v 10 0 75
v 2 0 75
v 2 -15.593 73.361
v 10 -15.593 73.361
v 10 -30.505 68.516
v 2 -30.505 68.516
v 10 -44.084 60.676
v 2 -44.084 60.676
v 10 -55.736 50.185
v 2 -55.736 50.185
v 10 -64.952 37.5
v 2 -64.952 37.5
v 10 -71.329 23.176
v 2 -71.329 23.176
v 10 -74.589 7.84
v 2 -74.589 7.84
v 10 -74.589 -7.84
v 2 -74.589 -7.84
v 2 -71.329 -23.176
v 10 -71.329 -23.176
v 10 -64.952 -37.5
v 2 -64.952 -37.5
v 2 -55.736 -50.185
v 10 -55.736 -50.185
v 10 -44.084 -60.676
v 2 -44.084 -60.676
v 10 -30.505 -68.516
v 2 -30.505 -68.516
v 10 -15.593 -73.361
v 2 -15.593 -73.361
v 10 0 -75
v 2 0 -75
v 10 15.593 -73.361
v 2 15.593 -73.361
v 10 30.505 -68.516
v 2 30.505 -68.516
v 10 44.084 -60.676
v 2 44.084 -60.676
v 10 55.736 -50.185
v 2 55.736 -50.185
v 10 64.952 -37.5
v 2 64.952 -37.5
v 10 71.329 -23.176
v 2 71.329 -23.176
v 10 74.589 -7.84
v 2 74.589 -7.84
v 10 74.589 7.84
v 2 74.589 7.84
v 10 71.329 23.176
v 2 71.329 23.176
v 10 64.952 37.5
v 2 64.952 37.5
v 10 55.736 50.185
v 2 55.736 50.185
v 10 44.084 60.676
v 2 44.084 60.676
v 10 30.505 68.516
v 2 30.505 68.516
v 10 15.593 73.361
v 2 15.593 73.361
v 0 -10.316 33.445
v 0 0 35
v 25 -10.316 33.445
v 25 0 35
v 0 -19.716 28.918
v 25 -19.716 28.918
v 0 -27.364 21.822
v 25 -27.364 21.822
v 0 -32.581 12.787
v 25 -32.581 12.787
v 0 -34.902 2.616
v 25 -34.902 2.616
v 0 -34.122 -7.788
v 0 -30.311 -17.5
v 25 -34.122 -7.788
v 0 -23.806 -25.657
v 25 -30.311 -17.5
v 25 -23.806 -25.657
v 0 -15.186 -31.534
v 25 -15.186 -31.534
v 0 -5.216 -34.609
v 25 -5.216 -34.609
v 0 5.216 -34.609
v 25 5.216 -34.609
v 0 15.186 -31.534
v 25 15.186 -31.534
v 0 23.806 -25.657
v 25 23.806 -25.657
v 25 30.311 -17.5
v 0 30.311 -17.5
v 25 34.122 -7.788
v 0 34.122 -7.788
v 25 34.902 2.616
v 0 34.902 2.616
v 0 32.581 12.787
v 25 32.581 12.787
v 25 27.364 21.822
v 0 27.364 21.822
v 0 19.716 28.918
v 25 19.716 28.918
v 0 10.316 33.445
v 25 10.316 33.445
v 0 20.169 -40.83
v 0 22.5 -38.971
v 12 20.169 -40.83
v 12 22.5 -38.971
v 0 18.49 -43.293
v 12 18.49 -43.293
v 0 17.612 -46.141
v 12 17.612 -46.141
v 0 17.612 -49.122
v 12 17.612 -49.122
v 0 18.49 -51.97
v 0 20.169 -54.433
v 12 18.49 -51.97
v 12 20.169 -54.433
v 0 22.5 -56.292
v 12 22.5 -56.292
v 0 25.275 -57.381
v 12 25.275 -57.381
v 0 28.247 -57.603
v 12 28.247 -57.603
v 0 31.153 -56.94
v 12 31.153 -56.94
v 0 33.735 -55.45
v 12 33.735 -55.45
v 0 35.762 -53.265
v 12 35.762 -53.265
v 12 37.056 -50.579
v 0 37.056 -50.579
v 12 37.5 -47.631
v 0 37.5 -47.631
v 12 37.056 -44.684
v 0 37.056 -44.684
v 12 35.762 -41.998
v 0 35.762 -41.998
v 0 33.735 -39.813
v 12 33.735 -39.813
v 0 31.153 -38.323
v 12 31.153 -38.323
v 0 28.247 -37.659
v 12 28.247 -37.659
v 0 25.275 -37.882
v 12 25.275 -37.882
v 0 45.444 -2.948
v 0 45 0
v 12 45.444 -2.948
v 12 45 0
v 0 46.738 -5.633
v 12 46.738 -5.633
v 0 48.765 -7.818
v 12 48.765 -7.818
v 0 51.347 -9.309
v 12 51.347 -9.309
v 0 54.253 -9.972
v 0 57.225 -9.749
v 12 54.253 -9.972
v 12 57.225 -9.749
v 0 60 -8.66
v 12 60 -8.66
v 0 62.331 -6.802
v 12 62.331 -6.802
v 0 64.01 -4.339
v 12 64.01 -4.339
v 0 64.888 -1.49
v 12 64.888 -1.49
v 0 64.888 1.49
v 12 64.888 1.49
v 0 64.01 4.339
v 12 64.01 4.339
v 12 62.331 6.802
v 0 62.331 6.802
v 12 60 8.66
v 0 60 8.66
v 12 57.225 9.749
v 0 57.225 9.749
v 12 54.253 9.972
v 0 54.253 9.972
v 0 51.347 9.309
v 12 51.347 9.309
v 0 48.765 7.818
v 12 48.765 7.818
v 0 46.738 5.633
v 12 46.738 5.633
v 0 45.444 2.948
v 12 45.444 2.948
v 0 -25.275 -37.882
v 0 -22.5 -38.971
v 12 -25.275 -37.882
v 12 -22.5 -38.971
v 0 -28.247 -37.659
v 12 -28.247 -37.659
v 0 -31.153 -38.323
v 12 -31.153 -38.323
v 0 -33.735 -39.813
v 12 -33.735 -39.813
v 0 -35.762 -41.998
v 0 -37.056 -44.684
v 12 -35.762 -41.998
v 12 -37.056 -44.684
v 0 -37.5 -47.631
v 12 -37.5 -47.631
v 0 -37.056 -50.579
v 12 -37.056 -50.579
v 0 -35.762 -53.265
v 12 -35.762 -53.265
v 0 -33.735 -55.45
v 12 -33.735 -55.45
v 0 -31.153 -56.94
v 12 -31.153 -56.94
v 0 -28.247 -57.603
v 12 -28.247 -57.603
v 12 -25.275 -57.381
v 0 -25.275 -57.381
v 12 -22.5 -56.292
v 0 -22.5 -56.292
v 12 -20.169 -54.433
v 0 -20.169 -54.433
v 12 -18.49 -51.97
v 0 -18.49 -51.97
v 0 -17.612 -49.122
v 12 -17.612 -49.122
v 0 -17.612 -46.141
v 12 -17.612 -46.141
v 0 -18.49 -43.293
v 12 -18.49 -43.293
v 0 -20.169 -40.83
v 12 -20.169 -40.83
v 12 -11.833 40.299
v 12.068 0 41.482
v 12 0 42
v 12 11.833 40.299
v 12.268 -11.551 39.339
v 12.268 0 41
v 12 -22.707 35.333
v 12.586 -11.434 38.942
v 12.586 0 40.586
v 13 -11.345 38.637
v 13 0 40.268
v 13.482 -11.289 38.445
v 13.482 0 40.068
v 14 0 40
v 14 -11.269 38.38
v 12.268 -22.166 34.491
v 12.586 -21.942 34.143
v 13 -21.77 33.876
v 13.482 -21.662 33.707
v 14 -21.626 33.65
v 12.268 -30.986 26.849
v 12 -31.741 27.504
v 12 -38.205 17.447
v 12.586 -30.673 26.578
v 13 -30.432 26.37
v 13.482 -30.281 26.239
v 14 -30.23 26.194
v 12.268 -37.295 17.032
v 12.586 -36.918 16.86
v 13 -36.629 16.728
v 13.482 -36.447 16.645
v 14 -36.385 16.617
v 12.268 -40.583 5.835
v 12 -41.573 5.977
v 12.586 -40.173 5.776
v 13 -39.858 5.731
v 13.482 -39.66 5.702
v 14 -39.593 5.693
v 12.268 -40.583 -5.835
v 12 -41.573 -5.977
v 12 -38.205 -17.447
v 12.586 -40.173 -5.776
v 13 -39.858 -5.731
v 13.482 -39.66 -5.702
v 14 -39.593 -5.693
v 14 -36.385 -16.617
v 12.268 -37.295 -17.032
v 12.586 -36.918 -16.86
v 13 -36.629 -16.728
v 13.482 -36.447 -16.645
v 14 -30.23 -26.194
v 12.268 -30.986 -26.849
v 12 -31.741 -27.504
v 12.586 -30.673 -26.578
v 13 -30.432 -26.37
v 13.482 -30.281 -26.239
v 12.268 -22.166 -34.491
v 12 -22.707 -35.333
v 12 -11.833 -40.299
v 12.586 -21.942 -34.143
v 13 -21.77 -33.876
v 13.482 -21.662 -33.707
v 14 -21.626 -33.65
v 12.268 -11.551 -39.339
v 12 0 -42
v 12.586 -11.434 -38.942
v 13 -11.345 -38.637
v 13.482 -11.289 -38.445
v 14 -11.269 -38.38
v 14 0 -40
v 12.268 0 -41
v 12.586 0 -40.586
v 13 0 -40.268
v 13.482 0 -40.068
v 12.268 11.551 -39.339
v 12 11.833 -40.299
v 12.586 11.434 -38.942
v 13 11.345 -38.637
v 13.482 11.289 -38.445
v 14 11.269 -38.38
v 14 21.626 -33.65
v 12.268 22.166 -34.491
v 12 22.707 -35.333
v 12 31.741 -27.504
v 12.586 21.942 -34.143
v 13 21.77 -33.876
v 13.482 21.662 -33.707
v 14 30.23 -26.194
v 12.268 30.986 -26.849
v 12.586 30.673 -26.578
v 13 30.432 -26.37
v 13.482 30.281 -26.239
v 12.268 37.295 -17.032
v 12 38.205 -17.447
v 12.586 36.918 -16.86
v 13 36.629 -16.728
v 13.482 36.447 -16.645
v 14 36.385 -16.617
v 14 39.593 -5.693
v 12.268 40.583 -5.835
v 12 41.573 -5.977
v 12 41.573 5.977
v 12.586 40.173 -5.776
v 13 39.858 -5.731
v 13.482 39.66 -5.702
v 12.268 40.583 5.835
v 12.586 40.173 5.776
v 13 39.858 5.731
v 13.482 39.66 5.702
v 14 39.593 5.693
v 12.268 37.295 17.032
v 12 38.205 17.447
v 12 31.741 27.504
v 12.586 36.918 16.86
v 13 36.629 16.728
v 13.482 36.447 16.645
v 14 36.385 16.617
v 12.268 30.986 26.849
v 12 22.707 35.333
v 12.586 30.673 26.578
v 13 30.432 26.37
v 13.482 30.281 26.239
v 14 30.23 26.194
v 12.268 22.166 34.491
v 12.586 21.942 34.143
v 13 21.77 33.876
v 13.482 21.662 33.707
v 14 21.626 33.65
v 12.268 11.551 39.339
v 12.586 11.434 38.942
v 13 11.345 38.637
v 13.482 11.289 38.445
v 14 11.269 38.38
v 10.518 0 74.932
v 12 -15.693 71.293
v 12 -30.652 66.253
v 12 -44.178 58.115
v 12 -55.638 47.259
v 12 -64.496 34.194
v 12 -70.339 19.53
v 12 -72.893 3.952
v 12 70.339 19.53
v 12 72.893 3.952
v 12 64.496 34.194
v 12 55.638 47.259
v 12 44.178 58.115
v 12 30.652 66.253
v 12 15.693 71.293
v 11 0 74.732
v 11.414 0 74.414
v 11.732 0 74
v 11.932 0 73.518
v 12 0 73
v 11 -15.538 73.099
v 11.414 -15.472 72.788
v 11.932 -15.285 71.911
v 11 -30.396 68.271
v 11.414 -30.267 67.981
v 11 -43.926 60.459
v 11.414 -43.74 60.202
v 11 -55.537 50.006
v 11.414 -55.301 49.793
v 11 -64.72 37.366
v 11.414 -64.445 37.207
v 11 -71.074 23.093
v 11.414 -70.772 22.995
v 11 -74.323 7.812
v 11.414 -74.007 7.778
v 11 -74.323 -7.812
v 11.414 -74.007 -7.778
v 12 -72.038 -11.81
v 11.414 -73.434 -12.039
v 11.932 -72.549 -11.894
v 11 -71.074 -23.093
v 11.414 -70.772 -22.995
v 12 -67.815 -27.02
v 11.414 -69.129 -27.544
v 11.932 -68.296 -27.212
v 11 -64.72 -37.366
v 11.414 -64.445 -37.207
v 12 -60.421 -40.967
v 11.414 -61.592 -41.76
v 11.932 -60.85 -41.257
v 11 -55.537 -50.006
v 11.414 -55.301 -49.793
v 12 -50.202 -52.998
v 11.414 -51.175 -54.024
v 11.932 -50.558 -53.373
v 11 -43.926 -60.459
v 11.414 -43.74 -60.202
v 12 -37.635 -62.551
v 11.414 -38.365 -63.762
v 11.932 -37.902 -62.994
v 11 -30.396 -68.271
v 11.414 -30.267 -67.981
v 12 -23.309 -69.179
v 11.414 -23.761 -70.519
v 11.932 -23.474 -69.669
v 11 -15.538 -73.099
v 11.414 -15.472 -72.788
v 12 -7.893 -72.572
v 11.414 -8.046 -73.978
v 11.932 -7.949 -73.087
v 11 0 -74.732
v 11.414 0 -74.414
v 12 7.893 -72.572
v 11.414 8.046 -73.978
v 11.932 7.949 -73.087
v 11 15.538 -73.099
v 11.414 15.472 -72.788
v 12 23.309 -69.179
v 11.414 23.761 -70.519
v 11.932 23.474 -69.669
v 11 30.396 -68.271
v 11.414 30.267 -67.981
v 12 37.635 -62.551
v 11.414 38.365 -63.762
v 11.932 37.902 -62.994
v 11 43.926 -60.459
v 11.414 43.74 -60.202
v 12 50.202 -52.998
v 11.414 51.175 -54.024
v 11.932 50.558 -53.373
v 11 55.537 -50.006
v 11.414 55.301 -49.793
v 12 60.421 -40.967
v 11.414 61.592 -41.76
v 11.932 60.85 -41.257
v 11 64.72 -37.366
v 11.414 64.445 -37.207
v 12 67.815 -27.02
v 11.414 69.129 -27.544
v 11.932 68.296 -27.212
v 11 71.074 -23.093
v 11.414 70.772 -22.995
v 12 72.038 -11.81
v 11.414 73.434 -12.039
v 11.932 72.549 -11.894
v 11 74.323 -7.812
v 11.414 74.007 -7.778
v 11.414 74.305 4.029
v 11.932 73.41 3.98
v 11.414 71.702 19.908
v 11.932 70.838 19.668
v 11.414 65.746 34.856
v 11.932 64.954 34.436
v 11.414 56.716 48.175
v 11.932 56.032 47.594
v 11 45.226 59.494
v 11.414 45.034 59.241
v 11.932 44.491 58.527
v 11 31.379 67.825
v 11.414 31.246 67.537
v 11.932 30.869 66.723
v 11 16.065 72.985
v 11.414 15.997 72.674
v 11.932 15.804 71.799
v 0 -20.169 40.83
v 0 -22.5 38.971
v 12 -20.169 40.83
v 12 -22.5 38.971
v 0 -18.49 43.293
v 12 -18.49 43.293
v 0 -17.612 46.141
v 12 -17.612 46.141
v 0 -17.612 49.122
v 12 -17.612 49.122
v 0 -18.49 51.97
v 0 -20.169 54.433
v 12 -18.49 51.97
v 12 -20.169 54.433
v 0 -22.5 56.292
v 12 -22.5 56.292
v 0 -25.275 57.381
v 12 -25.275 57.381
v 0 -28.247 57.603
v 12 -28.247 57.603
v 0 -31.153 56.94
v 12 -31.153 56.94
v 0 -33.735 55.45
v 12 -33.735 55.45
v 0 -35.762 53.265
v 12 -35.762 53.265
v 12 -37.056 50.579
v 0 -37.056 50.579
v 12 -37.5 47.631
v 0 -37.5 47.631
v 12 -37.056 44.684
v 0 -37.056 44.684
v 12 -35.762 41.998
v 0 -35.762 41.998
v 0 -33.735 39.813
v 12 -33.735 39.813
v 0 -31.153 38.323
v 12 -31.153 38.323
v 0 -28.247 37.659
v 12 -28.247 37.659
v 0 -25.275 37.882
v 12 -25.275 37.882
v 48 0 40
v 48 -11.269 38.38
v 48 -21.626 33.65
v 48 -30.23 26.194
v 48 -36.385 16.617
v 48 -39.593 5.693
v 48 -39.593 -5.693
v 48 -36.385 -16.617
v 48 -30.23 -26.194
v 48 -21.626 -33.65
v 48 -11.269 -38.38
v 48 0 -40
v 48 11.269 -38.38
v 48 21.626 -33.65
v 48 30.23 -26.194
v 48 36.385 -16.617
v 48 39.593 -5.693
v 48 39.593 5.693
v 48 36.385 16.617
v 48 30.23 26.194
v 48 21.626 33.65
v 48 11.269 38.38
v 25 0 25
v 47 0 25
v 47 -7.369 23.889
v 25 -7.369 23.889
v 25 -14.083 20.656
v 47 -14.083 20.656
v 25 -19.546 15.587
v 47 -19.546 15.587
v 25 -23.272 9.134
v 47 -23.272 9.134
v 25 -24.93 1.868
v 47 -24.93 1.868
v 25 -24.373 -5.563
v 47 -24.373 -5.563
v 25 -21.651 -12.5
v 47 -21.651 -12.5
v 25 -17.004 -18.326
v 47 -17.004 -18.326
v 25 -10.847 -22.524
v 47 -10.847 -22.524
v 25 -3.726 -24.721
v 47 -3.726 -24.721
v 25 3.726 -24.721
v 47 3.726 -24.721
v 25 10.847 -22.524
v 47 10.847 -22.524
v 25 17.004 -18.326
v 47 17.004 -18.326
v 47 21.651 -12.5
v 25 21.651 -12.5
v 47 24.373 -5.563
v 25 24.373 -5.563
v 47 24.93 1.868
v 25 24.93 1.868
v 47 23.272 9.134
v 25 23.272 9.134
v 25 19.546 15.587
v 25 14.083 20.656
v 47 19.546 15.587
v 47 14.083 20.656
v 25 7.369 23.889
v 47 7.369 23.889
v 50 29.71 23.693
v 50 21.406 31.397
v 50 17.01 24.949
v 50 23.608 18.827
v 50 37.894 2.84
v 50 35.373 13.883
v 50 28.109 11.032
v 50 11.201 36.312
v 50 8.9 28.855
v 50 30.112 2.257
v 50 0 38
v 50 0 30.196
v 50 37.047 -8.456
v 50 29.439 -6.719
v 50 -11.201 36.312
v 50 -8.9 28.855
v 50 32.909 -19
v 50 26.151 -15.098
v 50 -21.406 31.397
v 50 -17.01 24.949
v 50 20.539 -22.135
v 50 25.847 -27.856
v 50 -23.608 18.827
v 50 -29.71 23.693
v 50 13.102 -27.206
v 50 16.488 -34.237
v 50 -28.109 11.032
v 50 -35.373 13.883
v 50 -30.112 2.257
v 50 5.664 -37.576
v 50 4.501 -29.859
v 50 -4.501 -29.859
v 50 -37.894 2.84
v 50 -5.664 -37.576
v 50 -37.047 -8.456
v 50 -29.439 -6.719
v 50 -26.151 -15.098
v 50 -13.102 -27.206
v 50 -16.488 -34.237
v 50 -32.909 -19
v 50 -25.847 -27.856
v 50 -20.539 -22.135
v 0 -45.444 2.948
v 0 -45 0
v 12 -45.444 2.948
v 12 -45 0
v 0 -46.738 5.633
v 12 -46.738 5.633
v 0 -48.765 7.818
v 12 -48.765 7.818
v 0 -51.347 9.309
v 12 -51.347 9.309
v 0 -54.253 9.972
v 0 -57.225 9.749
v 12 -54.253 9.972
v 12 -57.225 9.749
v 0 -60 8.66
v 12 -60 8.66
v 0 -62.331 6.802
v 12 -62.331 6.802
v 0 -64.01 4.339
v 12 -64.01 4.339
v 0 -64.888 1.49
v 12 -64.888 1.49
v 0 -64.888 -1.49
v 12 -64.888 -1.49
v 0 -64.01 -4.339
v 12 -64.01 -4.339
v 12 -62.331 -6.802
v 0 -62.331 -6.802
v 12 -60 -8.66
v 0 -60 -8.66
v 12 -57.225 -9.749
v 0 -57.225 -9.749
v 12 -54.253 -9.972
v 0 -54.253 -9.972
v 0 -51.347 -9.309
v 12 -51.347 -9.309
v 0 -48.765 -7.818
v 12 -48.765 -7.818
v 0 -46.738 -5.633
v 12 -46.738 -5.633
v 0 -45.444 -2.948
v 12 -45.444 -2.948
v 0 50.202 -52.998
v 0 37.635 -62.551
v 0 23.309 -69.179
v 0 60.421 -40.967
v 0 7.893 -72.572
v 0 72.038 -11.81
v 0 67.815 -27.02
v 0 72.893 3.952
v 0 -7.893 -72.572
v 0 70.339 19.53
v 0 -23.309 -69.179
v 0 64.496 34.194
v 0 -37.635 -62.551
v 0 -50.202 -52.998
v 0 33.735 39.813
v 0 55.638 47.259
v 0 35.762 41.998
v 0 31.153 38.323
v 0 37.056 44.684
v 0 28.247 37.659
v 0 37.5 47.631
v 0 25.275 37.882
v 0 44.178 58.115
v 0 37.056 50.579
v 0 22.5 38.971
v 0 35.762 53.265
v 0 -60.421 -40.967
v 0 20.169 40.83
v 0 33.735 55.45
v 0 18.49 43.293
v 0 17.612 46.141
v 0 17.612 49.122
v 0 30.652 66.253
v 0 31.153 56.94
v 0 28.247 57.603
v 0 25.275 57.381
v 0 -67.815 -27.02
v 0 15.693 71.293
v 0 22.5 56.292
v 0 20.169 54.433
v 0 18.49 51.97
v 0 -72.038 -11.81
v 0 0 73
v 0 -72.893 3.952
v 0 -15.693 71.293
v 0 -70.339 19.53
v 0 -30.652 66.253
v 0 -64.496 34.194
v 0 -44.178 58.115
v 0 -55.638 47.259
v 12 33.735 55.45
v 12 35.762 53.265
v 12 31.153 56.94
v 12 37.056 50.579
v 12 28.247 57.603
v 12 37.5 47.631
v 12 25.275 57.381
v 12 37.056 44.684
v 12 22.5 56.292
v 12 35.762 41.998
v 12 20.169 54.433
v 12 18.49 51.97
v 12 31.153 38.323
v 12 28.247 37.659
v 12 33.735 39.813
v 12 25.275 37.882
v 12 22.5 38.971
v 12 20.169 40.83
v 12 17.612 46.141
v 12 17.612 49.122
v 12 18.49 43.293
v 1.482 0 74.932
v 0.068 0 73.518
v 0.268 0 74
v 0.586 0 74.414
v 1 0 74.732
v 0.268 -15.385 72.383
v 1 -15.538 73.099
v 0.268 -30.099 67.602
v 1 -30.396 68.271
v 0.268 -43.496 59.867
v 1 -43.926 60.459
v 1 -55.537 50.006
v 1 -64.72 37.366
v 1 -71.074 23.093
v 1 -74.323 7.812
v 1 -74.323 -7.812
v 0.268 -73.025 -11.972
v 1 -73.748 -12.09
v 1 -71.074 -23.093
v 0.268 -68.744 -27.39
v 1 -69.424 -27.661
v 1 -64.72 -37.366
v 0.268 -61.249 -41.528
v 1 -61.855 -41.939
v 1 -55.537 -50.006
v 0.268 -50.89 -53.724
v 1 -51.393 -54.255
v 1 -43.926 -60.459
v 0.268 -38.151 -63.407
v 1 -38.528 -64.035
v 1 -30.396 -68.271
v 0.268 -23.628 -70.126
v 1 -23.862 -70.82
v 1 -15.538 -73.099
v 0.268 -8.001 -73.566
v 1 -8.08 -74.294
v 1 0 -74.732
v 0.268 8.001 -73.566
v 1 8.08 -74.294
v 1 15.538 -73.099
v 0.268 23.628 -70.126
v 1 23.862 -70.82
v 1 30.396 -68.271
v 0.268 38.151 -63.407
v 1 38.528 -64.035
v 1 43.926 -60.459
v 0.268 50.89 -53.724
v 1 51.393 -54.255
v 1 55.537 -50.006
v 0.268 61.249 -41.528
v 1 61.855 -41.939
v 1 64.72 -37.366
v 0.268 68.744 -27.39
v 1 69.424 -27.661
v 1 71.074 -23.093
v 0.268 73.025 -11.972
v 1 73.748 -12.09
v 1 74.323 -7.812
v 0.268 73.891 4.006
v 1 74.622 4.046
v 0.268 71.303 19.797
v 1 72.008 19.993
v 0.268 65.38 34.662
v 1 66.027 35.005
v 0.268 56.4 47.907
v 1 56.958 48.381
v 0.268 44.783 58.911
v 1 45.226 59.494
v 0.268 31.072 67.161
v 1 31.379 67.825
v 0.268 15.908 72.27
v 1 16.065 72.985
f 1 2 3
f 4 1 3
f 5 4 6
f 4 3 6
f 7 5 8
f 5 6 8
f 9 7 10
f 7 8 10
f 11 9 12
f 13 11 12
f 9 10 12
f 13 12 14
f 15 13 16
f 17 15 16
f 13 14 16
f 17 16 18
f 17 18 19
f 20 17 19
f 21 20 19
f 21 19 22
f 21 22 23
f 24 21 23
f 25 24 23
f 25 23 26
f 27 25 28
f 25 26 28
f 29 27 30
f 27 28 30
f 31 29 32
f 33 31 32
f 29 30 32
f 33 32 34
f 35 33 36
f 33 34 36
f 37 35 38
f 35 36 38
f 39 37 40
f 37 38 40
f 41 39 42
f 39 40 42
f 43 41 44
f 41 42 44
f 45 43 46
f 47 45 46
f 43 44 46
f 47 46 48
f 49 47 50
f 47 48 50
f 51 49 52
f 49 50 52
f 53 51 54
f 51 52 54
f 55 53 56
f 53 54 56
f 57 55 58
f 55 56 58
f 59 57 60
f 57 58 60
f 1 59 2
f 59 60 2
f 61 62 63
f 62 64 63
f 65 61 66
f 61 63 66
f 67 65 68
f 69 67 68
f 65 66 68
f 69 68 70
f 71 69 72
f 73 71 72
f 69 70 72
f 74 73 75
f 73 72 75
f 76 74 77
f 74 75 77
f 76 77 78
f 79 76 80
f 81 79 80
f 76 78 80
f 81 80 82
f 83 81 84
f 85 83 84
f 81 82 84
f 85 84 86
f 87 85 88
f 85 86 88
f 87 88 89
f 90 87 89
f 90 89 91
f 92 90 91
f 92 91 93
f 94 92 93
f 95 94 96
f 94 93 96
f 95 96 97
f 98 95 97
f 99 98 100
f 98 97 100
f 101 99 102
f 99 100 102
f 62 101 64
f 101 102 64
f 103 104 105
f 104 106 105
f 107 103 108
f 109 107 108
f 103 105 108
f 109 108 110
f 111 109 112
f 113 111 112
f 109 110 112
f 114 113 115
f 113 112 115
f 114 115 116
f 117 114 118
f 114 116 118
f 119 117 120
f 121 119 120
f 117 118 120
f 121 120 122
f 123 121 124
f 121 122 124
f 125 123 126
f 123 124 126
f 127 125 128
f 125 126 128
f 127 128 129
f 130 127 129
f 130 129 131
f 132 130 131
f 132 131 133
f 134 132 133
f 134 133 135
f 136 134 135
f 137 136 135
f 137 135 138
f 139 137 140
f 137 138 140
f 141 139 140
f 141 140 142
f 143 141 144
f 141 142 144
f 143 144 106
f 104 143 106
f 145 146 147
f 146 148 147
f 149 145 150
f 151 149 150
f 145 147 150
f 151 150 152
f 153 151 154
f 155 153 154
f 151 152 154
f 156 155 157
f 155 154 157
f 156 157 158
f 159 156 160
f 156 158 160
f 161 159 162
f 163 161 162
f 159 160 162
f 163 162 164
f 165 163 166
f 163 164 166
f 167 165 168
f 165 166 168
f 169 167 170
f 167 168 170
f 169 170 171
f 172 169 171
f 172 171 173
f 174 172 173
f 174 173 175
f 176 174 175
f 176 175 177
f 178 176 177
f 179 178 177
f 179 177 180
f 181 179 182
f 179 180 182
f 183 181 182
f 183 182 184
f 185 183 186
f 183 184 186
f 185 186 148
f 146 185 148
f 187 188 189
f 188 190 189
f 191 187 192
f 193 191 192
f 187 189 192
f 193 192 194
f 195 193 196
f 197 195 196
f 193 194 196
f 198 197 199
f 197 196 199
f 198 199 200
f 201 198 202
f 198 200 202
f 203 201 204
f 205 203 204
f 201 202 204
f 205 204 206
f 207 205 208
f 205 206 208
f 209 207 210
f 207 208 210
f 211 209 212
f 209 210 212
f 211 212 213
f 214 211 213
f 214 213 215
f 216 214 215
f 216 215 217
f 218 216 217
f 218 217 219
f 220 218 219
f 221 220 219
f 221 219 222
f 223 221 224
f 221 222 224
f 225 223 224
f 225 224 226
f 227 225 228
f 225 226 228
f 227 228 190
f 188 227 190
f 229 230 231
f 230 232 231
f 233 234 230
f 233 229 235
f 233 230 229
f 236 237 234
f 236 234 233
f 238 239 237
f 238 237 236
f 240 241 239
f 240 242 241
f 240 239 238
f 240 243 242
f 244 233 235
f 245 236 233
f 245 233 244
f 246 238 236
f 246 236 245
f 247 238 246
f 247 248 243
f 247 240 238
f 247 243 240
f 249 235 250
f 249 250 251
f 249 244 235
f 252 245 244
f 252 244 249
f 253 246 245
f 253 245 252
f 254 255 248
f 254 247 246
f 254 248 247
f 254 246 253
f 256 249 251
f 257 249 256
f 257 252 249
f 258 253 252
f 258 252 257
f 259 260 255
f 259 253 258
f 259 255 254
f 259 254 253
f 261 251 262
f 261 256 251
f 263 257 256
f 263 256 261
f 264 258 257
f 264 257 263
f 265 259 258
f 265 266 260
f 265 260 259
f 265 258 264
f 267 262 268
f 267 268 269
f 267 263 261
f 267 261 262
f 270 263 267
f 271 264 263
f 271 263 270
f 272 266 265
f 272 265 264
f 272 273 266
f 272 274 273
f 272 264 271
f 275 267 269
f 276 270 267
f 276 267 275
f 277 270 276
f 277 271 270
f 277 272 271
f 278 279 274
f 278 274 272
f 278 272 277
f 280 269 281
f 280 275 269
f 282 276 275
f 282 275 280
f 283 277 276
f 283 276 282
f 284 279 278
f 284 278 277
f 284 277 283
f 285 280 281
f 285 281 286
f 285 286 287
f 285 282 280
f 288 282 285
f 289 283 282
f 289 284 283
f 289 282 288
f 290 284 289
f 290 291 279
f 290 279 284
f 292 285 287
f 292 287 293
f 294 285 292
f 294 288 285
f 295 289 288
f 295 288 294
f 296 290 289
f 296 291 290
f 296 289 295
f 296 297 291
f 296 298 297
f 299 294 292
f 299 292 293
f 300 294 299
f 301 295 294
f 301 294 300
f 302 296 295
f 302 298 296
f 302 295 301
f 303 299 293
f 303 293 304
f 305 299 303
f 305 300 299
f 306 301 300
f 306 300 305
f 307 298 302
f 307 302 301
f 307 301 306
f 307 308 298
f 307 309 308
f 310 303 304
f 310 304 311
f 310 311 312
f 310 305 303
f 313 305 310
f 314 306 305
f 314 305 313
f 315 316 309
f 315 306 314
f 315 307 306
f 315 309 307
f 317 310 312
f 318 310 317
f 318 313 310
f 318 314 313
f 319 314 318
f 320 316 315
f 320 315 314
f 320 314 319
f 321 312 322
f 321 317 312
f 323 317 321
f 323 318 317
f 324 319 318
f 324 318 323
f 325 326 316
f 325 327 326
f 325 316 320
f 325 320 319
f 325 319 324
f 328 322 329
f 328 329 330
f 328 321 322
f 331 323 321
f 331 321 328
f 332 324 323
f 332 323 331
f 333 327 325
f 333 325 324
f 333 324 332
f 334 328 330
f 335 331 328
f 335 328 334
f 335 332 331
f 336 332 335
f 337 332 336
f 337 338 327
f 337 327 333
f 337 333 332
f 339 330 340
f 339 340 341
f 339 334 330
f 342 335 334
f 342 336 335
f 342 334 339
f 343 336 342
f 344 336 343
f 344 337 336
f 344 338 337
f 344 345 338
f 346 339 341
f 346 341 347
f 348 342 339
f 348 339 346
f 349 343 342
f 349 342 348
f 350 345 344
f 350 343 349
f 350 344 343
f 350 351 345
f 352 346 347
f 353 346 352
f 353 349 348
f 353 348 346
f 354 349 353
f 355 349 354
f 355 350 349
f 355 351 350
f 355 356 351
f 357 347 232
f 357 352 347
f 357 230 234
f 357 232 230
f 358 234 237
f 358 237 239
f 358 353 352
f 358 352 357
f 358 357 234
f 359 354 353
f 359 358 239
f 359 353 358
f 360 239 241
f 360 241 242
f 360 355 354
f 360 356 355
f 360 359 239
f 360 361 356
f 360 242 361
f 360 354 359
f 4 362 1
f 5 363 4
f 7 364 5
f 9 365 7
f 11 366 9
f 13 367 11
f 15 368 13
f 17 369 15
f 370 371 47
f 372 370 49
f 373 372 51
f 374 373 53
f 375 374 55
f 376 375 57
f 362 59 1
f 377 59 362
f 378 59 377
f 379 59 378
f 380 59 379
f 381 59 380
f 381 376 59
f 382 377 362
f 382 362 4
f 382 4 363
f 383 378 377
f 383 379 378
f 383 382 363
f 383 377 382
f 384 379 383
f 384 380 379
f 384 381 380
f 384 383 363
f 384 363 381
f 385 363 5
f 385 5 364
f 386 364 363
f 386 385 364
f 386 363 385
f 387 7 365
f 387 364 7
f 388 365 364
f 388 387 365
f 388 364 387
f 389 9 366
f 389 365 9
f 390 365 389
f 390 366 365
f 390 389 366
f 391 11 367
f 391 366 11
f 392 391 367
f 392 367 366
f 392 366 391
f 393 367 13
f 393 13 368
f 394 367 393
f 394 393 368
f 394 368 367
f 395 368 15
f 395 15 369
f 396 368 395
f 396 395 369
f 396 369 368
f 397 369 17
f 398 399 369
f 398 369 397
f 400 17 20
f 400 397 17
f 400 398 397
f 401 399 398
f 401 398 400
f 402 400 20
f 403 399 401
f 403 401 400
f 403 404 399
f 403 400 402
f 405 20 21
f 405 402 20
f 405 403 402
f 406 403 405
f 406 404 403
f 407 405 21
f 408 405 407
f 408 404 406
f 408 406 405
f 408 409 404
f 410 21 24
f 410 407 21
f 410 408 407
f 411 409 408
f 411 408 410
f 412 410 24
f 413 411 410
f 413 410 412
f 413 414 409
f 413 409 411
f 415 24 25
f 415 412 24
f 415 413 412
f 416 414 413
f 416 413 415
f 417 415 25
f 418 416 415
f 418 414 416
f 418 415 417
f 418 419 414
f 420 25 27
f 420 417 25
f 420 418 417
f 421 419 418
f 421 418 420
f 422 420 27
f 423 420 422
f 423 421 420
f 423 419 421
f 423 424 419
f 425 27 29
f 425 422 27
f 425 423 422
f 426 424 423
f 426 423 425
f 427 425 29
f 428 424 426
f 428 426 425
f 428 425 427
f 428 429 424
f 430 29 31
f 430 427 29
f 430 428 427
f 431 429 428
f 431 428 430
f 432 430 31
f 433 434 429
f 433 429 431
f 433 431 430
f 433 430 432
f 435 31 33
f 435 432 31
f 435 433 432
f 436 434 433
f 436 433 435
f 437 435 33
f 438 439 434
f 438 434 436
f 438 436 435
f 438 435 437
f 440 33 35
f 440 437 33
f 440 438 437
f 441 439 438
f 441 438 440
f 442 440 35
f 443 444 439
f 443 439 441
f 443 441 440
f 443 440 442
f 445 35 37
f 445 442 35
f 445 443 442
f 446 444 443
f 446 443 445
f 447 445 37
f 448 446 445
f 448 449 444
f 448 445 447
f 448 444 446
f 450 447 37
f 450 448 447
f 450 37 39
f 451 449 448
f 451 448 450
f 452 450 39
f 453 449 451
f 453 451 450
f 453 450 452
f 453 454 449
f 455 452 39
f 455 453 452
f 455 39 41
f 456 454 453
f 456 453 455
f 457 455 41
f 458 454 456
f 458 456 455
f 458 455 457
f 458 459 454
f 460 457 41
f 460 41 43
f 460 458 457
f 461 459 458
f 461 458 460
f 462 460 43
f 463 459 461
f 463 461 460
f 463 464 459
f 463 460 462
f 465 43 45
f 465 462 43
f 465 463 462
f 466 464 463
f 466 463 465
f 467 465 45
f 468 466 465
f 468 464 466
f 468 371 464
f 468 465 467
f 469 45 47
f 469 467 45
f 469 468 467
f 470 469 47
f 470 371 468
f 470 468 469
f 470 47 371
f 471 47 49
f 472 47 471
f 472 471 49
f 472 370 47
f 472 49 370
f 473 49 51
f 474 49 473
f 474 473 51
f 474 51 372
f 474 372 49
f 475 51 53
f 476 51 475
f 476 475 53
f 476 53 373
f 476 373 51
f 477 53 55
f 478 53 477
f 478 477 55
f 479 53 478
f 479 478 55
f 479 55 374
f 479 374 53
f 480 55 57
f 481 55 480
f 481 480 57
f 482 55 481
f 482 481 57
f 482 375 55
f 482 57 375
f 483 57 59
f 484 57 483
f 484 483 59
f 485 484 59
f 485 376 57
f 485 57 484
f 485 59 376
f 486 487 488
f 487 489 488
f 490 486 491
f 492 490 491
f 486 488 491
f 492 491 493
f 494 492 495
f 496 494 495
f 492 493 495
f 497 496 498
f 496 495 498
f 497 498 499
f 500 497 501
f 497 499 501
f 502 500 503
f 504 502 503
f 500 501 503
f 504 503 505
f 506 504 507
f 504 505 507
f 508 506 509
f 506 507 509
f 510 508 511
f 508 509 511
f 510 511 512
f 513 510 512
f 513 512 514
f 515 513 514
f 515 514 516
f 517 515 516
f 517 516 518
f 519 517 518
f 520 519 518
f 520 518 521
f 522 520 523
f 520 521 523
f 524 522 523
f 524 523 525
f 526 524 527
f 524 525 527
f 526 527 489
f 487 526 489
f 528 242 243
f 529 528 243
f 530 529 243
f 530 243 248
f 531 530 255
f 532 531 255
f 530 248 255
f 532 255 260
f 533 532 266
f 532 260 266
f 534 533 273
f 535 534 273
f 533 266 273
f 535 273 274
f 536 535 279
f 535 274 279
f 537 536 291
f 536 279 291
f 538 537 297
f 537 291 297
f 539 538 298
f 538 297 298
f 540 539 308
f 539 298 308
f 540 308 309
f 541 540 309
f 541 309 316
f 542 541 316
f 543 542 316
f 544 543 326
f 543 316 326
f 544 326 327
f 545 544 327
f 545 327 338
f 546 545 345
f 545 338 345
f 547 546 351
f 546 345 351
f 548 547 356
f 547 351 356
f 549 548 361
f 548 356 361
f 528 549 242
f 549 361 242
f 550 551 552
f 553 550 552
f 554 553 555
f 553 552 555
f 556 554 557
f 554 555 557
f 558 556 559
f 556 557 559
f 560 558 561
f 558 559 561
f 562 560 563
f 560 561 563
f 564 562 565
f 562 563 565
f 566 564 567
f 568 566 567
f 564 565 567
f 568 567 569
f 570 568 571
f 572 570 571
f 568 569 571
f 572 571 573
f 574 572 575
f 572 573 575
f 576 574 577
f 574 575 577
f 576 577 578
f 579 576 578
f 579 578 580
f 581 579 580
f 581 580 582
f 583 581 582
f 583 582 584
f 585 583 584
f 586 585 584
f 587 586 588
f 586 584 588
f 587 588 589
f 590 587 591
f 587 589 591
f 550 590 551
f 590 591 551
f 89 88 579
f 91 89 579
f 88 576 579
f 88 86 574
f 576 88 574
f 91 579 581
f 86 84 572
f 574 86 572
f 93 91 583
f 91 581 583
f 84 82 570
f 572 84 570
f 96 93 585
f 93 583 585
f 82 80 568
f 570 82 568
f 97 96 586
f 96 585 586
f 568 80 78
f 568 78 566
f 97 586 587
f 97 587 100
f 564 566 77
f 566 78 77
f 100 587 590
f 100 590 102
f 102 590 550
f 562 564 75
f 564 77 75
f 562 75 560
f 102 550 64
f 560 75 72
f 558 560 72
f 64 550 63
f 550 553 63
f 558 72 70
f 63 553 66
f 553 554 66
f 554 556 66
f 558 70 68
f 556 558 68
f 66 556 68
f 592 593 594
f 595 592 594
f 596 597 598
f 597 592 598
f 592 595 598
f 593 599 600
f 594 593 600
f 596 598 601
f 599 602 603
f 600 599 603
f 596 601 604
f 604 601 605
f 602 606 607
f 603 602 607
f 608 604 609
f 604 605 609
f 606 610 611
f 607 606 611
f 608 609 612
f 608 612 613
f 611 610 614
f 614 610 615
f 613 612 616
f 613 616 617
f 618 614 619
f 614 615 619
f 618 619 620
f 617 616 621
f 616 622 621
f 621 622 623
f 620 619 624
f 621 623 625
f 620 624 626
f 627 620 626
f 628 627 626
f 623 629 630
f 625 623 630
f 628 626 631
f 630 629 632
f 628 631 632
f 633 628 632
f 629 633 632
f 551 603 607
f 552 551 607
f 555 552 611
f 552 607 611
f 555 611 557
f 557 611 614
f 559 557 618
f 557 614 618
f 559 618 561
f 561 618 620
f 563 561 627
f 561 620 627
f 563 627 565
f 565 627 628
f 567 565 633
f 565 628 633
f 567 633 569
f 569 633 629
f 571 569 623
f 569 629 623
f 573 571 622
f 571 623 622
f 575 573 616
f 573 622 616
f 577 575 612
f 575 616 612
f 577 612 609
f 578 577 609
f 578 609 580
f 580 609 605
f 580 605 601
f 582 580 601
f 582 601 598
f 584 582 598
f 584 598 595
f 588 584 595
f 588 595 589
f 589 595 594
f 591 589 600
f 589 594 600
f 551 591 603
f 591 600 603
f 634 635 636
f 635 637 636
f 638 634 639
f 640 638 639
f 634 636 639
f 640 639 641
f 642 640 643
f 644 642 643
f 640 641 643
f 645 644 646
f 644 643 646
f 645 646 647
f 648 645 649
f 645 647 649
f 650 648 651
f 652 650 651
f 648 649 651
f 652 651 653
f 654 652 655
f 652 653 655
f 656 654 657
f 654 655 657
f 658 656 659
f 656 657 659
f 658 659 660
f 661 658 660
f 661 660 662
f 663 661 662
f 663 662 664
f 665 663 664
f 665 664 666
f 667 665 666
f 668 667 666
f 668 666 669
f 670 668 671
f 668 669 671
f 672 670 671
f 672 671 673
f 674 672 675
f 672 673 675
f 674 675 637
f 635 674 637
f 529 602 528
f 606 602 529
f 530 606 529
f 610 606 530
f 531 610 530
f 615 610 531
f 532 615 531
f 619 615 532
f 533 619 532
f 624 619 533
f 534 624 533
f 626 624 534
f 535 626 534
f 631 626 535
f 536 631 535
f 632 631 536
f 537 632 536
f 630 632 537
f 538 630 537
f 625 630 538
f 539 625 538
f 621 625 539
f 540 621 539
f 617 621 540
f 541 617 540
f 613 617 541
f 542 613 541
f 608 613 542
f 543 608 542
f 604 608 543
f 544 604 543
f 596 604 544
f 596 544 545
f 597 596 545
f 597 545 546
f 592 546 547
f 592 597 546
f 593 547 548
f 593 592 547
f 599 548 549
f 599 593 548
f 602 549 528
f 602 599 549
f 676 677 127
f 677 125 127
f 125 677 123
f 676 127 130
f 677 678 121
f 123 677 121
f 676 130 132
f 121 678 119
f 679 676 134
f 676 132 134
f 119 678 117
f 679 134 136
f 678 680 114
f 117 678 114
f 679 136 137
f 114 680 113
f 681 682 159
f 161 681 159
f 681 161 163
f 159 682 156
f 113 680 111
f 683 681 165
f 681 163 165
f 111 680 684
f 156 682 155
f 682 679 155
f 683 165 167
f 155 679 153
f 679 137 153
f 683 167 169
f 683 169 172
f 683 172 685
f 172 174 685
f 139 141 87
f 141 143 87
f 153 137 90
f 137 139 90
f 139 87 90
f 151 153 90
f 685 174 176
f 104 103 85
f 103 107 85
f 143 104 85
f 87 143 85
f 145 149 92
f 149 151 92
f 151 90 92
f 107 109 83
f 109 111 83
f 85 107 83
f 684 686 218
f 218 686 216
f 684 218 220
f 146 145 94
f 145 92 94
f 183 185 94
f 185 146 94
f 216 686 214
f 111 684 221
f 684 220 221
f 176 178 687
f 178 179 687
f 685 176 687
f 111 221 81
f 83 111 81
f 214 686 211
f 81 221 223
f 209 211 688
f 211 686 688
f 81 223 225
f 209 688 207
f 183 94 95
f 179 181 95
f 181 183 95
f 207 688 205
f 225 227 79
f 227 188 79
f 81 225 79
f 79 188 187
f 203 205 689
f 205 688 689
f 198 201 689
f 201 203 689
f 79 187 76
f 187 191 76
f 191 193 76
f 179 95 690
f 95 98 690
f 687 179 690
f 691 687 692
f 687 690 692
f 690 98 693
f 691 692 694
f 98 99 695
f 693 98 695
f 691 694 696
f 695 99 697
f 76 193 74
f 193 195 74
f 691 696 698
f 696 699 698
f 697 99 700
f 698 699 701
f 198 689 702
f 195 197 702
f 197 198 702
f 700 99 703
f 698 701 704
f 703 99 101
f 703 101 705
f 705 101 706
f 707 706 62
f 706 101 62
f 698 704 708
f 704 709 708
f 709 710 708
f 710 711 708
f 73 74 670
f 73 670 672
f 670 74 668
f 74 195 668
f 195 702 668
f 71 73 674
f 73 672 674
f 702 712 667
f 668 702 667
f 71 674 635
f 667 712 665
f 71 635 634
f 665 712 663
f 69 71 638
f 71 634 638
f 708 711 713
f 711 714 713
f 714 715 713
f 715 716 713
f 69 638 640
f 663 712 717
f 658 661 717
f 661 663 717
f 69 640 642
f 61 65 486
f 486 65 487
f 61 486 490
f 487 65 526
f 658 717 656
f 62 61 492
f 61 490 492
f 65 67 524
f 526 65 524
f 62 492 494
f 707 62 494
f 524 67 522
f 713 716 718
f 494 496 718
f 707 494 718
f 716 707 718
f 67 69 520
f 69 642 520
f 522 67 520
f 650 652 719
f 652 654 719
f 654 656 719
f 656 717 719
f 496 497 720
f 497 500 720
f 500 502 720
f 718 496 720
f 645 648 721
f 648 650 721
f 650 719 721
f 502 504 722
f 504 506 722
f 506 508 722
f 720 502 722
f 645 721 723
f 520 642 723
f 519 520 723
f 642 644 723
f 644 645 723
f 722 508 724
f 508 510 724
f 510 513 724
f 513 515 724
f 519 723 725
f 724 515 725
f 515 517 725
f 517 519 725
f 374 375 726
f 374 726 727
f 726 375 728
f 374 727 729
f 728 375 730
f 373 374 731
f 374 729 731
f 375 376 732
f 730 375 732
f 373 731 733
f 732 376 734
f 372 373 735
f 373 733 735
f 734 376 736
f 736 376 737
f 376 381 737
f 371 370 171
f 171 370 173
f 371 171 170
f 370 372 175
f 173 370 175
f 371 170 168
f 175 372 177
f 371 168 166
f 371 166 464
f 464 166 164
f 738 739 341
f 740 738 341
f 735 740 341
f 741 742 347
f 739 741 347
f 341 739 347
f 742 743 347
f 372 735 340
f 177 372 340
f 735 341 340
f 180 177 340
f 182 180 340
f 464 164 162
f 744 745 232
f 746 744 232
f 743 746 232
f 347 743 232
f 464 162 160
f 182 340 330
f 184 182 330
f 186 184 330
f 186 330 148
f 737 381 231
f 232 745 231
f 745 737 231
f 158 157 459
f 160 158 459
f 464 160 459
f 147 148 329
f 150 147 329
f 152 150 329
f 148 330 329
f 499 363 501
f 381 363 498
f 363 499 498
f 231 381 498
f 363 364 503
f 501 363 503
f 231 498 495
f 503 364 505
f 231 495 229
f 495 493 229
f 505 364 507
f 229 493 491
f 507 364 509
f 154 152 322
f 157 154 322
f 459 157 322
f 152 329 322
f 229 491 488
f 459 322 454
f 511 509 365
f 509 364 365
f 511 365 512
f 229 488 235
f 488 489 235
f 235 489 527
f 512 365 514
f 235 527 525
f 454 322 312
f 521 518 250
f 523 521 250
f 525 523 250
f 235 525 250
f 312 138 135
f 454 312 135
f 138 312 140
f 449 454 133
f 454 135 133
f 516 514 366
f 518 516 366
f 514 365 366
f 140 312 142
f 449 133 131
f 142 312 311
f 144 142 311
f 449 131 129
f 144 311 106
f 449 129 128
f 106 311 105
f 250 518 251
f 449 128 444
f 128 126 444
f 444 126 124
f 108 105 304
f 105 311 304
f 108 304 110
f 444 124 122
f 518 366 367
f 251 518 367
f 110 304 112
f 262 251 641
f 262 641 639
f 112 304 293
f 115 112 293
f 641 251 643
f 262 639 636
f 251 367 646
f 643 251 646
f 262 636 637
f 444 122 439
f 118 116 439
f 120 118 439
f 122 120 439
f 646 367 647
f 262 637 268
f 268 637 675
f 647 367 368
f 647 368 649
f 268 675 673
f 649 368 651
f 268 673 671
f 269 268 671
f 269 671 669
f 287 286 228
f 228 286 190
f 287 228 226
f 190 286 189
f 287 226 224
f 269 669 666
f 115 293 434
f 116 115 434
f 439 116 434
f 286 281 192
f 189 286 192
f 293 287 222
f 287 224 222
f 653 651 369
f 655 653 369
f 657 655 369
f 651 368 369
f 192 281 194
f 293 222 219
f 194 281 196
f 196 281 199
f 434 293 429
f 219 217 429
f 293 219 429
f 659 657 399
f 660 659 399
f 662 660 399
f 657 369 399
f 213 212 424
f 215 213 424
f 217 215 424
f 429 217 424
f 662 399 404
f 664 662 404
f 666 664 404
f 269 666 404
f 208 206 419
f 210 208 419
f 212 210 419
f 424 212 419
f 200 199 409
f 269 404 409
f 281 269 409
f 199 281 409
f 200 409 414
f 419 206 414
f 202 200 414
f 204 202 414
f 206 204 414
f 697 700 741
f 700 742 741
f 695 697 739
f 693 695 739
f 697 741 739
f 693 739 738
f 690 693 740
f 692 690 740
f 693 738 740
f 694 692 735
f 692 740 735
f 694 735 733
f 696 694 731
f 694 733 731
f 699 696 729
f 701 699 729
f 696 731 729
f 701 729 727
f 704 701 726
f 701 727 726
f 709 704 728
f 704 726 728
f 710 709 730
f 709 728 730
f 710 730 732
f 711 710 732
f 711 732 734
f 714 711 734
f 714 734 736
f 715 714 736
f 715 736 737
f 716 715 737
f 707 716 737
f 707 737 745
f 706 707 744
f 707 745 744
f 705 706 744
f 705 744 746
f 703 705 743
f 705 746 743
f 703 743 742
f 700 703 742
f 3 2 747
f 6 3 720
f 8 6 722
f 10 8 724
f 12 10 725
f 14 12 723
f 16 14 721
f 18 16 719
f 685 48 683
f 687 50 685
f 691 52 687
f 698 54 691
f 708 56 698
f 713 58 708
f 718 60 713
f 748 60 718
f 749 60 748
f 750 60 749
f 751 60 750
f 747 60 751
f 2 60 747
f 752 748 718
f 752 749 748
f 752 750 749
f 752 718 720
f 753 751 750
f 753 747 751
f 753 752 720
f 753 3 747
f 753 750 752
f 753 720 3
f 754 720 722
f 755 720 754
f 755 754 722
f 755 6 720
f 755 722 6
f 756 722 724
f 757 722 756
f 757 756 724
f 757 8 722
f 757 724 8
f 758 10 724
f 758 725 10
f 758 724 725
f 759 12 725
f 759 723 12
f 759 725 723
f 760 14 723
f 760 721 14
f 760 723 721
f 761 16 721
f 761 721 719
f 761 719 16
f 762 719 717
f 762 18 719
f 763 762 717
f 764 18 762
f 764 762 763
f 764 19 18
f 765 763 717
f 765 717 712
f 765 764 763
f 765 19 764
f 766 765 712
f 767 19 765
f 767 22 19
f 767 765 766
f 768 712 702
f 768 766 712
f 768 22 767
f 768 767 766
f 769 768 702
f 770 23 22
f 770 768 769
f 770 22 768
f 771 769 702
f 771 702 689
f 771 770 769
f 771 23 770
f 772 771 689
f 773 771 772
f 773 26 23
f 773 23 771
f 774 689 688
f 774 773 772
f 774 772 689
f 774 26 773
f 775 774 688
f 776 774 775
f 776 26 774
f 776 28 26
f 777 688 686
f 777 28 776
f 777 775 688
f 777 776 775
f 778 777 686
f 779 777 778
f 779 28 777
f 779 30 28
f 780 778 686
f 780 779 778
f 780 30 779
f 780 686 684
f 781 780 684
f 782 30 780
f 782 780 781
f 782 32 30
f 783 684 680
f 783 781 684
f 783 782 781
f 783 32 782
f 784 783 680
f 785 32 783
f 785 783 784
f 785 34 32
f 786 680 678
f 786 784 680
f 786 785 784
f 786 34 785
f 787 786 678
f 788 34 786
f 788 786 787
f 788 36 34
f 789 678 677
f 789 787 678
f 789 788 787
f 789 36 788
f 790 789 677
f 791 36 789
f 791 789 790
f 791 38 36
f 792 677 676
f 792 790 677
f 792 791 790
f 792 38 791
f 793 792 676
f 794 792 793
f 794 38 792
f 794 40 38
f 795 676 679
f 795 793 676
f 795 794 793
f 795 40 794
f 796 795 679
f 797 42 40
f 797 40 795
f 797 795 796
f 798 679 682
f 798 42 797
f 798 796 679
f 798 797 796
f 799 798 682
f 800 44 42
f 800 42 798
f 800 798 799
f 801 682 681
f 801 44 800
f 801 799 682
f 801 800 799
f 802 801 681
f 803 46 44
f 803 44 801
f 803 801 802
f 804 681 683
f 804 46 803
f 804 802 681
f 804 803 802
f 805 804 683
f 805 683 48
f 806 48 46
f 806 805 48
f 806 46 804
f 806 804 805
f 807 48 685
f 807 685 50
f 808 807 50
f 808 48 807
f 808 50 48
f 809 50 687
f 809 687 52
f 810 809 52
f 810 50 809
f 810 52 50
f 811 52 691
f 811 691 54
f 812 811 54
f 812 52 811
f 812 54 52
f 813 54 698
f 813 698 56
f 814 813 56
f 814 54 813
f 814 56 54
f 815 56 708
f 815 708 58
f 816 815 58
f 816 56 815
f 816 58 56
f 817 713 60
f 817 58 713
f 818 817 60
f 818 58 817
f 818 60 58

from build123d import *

# Parameters (mm, degrees)
SKETCH_2_W               = 12
SKETCH_2_H               = 10
PATTERN_CIRCULAR_1_COUNT = 6
FILLET_1_R               = 2
CHAMFER_1_SIZE           = 2
CHAMFER_3_SIZE           = 3
CHAMFER_3_SIZE2          = 5.196152423


with BuildPart() as part:
    # Эскиз1 → Повернуть1 (revolve)
    with BuildSketch(Plane.XY, mode=Mode.PRIVATE) as revolve_1_sk:
        Polygon((0, 35), (25, 35), (25, 25), (50, 25), (50, 40), (12, 40), (12, 75), (0, 75), align=None)
    revolve(revolve_1_sk.sketch.rotate(Axis((0, 0, 0), (1, 0, 0)), 90), axis=Axis((0, 0, 0), (1, 0, 0)))

    # Эскиз2 → Вырез-Повернуть1 (revolve, cut)
    with BuildSketch(Plane.XY, mode=Mode.PRIVATE) as cut_revolve_1_sk:
        with Locations((6, 60)):
            Rectangle(SKETCH_2_W, SKETCH_2_H)
    cut_revolve_1 = revolve(cut_revolve_1_sk.sketch.rotate(Axis((12, 55, 0), (1, 0, 0)), 180), axis=Axis((12, 55, 0), (1, 0, 0)), mode=Mode.SUBTRACT)

    # Круговой массив1: Вырез-Повернуть1 ×6 about axis
    pattern_circular_1_axis = Axis((0, 0, 0), (1, 0, 0))
    for i in range(1, PATTERN_CIRCULAR_1_COUNT):
        add(cut_revolve_1.rotate(pattern_circular_1_axis, i * 360 / PATTERN_CIRCULAR_1_COUNT), mode=Mode.SUBTRACT)

    # Скругление1
    fillet_1_edges = [part.edges().sort_by_distance(p)[0] for p in [
        (0, 0, -75),
        (12, 0, -75),
        (12, 0, -40),
    ]]
    fillet(fillet_1_edges, radius=FILLET_1_R)

    # Фаска1
    chamfer_1_edges = [part.edges().sort_by_distance(p)[0] for p in [
        (50, 0, -40),
    ]]
    chamfer(chamfer_1_edges, length=CHAMFER_1_SIZE)

    # Фаска3
    chamfer_3_edges = [part.edges().sort_by_distance(p)[0] for p in [
        (50, 0, -25),
    ]]
    chamfer_3_side = [part.faces().sort_by_distance(p)[0] for p in [
        (37.5, 0, -25),
    ]]
    chamfer(chamfer_3_edges, length=CHAMFER_3_SIZE, length2=CHAMFER_3_SIZE2, reference=chamfer_3_side[0])


solid = part.part
